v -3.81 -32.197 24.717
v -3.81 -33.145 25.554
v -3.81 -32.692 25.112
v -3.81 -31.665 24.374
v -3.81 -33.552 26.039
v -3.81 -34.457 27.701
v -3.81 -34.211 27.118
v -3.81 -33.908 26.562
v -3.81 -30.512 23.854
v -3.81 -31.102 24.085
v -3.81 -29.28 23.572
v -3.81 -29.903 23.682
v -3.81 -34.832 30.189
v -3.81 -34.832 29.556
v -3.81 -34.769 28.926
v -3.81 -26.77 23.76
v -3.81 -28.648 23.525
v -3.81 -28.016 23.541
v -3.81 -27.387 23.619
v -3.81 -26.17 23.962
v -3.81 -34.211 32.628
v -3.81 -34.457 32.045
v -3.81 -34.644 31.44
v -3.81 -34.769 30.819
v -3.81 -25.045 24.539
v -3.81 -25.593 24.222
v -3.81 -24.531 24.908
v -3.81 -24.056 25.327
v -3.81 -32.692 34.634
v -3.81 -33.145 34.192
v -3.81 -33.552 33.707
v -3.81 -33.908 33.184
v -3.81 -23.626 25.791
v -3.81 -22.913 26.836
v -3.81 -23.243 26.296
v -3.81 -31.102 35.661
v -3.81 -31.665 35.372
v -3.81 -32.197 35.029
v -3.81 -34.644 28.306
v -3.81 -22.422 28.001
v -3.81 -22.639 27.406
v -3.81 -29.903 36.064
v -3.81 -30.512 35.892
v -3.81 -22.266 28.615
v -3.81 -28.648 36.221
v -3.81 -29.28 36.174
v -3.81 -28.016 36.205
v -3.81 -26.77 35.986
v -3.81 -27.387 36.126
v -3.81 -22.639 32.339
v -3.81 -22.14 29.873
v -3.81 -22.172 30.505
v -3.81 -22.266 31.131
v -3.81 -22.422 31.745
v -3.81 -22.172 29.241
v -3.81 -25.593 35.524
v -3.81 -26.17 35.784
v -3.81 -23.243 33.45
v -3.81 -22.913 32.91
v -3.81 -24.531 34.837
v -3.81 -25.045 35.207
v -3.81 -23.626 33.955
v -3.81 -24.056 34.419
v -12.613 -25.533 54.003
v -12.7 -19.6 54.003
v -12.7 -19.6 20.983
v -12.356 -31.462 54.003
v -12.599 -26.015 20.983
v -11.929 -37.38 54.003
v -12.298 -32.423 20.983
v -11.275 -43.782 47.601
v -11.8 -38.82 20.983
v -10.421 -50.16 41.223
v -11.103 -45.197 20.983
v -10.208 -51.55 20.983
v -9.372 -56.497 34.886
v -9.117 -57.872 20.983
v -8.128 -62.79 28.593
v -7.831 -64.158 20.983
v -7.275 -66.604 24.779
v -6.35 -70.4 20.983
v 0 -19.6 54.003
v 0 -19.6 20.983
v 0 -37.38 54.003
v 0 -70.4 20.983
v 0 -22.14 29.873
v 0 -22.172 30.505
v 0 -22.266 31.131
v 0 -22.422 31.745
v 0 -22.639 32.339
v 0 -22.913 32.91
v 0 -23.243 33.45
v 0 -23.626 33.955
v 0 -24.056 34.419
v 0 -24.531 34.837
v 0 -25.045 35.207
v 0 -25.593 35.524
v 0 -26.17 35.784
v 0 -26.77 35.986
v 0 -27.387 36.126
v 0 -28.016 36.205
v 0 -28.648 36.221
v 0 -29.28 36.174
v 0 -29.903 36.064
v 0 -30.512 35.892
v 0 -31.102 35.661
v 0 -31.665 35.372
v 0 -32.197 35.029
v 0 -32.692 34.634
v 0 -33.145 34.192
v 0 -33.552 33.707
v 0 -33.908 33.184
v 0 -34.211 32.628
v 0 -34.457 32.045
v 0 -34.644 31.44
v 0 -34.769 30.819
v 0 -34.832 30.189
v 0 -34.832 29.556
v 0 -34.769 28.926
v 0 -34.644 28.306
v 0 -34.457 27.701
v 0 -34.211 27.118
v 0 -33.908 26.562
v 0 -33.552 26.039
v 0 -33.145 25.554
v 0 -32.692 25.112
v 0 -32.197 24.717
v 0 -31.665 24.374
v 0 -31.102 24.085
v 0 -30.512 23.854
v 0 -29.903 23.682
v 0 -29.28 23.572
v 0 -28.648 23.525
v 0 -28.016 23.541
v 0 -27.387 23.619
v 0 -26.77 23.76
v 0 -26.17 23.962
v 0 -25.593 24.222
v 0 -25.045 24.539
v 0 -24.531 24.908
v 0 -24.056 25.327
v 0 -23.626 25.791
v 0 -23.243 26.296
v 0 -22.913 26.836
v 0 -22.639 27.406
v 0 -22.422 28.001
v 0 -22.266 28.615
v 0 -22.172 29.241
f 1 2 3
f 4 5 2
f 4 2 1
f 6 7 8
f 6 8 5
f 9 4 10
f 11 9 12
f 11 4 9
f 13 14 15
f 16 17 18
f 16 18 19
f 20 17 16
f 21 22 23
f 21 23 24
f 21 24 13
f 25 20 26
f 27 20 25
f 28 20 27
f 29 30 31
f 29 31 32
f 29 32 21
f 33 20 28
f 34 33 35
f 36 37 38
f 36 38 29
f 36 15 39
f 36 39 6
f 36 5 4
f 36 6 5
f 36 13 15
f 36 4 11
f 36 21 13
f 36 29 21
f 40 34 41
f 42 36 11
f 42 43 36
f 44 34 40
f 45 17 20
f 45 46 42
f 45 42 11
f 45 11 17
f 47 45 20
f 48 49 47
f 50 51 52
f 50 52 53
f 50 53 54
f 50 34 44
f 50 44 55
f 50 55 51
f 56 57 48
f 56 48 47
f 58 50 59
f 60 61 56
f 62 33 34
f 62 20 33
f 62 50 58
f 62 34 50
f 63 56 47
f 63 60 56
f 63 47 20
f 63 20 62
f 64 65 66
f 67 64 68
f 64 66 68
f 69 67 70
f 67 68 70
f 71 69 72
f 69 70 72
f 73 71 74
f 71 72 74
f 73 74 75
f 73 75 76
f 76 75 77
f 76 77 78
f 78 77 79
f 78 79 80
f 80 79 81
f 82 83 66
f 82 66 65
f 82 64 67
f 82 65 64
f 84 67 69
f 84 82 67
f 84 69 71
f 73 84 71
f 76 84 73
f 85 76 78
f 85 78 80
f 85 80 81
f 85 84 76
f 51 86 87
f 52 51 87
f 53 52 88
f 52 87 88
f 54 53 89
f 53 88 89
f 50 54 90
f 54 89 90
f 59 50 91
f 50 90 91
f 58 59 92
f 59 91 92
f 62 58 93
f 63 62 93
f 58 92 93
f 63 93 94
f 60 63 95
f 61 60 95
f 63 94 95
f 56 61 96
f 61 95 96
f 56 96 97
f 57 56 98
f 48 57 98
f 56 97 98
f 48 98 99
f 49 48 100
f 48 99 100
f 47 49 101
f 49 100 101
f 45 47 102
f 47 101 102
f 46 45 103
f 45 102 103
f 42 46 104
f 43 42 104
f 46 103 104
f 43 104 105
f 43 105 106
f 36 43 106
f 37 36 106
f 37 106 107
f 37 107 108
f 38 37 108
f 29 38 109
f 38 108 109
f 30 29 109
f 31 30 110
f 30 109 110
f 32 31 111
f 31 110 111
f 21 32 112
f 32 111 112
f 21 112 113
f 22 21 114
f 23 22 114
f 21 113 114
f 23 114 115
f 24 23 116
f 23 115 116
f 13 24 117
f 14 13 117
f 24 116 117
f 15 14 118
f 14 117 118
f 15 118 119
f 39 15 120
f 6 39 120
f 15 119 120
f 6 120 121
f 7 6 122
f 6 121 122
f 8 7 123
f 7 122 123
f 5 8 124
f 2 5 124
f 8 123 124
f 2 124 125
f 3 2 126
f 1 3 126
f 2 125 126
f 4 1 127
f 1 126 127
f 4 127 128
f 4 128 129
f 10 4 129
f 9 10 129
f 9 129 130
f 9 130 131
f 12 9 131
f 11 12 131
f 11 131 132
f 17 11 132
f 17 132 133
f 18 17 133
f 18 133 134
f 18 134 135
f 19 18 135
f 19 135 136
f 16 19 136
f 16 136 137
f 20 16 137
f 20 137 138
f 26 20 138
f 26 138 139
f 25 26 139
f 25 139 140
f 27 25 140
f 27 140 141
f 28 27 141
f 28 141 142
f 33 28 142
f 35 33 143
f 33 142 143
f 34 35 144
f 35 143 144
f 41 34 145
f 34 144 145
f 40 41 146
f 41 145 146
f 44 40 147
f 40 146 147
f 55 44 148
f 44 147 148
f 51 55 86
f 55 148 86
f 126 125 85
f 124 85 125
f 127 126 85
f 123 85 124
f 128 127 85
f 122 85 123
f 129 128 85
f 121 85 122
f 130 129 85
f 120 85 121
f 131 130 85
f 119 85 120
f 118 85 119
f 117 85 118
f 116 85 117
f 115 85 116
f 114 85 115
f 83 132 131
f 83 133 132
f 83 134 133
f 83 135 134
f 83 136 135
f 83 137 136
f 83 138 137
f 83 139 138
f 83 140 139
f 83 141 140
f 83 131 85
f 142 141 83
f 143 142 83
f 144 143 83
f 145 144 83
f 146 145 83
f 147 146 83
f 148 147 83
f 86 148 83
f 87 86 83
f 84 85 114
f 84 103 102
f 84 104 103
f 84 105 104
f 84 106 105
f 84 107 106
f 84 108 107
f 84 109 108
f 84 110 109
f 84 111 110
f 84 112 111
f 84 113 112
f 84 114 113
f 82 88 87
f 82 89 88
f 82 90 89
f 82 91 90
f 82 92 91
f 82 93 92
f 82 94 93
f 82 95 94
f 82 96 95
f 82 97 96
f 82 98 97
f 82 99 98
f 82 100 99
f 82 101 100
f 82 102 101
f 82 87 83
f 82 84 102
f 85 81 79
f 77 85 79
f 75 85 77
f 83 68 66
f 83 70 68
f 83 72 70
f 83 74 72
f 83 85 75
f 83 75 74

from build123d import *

# Parameters (mm, degrees)
F0_R     = 6.35
F1_DEPTH = 12.7
F2_DEPTH = 3.81
F4_DEPTH = 50.8


with BuildPart() as f1:
    # F0 (on Right) → F1 (new body)
    with BuildSketch(Plane.YZ):
        Polygon((-37.380086, 54.002845), (-70.400086, 20.982845), (-19.600086, 20.982845), (-19.600086, 54.002845), align=None)
        with Locations((-28.490086, 29.872845)):
            Circle(F0_R, mode=Mode.SUBTRACT)
        with Locations((-28.490086, 29.872845)):
            Circle(F0_R)
    extrude(amount=-F1_DEPTH)

    # F0 (on Right) → F2 (cut)
    with BuildSketch(Plane.YZ):
        with Locations((-28.490086, 29.872845)):
            Circle(F0_R)
    extrude(amount=-F2_DEPTH, mode=Mode.SUBTRACT)

    # F3 (on face) → F4 (cut)
    with BuildSketch(Plane(origin=(0, 0, 20.982845), x_dir=(1, 0, 0), z_dir=(0, 0, -1))):
        with BuildLine():
            ThreePointArc((-12.7, 19.600086), (-11.102629, 45.19729), (-6.35, 70.400086))
            Line((-6.35, 70.400086), (-12.7, 70.400086))
            Line((-12.7, 70.400086), (-12.7, 19.600086))
        make_face()
    extrude(amount=-F4_DEPTH, mode=Mode.SUBTRACT)


solid = f1.part
